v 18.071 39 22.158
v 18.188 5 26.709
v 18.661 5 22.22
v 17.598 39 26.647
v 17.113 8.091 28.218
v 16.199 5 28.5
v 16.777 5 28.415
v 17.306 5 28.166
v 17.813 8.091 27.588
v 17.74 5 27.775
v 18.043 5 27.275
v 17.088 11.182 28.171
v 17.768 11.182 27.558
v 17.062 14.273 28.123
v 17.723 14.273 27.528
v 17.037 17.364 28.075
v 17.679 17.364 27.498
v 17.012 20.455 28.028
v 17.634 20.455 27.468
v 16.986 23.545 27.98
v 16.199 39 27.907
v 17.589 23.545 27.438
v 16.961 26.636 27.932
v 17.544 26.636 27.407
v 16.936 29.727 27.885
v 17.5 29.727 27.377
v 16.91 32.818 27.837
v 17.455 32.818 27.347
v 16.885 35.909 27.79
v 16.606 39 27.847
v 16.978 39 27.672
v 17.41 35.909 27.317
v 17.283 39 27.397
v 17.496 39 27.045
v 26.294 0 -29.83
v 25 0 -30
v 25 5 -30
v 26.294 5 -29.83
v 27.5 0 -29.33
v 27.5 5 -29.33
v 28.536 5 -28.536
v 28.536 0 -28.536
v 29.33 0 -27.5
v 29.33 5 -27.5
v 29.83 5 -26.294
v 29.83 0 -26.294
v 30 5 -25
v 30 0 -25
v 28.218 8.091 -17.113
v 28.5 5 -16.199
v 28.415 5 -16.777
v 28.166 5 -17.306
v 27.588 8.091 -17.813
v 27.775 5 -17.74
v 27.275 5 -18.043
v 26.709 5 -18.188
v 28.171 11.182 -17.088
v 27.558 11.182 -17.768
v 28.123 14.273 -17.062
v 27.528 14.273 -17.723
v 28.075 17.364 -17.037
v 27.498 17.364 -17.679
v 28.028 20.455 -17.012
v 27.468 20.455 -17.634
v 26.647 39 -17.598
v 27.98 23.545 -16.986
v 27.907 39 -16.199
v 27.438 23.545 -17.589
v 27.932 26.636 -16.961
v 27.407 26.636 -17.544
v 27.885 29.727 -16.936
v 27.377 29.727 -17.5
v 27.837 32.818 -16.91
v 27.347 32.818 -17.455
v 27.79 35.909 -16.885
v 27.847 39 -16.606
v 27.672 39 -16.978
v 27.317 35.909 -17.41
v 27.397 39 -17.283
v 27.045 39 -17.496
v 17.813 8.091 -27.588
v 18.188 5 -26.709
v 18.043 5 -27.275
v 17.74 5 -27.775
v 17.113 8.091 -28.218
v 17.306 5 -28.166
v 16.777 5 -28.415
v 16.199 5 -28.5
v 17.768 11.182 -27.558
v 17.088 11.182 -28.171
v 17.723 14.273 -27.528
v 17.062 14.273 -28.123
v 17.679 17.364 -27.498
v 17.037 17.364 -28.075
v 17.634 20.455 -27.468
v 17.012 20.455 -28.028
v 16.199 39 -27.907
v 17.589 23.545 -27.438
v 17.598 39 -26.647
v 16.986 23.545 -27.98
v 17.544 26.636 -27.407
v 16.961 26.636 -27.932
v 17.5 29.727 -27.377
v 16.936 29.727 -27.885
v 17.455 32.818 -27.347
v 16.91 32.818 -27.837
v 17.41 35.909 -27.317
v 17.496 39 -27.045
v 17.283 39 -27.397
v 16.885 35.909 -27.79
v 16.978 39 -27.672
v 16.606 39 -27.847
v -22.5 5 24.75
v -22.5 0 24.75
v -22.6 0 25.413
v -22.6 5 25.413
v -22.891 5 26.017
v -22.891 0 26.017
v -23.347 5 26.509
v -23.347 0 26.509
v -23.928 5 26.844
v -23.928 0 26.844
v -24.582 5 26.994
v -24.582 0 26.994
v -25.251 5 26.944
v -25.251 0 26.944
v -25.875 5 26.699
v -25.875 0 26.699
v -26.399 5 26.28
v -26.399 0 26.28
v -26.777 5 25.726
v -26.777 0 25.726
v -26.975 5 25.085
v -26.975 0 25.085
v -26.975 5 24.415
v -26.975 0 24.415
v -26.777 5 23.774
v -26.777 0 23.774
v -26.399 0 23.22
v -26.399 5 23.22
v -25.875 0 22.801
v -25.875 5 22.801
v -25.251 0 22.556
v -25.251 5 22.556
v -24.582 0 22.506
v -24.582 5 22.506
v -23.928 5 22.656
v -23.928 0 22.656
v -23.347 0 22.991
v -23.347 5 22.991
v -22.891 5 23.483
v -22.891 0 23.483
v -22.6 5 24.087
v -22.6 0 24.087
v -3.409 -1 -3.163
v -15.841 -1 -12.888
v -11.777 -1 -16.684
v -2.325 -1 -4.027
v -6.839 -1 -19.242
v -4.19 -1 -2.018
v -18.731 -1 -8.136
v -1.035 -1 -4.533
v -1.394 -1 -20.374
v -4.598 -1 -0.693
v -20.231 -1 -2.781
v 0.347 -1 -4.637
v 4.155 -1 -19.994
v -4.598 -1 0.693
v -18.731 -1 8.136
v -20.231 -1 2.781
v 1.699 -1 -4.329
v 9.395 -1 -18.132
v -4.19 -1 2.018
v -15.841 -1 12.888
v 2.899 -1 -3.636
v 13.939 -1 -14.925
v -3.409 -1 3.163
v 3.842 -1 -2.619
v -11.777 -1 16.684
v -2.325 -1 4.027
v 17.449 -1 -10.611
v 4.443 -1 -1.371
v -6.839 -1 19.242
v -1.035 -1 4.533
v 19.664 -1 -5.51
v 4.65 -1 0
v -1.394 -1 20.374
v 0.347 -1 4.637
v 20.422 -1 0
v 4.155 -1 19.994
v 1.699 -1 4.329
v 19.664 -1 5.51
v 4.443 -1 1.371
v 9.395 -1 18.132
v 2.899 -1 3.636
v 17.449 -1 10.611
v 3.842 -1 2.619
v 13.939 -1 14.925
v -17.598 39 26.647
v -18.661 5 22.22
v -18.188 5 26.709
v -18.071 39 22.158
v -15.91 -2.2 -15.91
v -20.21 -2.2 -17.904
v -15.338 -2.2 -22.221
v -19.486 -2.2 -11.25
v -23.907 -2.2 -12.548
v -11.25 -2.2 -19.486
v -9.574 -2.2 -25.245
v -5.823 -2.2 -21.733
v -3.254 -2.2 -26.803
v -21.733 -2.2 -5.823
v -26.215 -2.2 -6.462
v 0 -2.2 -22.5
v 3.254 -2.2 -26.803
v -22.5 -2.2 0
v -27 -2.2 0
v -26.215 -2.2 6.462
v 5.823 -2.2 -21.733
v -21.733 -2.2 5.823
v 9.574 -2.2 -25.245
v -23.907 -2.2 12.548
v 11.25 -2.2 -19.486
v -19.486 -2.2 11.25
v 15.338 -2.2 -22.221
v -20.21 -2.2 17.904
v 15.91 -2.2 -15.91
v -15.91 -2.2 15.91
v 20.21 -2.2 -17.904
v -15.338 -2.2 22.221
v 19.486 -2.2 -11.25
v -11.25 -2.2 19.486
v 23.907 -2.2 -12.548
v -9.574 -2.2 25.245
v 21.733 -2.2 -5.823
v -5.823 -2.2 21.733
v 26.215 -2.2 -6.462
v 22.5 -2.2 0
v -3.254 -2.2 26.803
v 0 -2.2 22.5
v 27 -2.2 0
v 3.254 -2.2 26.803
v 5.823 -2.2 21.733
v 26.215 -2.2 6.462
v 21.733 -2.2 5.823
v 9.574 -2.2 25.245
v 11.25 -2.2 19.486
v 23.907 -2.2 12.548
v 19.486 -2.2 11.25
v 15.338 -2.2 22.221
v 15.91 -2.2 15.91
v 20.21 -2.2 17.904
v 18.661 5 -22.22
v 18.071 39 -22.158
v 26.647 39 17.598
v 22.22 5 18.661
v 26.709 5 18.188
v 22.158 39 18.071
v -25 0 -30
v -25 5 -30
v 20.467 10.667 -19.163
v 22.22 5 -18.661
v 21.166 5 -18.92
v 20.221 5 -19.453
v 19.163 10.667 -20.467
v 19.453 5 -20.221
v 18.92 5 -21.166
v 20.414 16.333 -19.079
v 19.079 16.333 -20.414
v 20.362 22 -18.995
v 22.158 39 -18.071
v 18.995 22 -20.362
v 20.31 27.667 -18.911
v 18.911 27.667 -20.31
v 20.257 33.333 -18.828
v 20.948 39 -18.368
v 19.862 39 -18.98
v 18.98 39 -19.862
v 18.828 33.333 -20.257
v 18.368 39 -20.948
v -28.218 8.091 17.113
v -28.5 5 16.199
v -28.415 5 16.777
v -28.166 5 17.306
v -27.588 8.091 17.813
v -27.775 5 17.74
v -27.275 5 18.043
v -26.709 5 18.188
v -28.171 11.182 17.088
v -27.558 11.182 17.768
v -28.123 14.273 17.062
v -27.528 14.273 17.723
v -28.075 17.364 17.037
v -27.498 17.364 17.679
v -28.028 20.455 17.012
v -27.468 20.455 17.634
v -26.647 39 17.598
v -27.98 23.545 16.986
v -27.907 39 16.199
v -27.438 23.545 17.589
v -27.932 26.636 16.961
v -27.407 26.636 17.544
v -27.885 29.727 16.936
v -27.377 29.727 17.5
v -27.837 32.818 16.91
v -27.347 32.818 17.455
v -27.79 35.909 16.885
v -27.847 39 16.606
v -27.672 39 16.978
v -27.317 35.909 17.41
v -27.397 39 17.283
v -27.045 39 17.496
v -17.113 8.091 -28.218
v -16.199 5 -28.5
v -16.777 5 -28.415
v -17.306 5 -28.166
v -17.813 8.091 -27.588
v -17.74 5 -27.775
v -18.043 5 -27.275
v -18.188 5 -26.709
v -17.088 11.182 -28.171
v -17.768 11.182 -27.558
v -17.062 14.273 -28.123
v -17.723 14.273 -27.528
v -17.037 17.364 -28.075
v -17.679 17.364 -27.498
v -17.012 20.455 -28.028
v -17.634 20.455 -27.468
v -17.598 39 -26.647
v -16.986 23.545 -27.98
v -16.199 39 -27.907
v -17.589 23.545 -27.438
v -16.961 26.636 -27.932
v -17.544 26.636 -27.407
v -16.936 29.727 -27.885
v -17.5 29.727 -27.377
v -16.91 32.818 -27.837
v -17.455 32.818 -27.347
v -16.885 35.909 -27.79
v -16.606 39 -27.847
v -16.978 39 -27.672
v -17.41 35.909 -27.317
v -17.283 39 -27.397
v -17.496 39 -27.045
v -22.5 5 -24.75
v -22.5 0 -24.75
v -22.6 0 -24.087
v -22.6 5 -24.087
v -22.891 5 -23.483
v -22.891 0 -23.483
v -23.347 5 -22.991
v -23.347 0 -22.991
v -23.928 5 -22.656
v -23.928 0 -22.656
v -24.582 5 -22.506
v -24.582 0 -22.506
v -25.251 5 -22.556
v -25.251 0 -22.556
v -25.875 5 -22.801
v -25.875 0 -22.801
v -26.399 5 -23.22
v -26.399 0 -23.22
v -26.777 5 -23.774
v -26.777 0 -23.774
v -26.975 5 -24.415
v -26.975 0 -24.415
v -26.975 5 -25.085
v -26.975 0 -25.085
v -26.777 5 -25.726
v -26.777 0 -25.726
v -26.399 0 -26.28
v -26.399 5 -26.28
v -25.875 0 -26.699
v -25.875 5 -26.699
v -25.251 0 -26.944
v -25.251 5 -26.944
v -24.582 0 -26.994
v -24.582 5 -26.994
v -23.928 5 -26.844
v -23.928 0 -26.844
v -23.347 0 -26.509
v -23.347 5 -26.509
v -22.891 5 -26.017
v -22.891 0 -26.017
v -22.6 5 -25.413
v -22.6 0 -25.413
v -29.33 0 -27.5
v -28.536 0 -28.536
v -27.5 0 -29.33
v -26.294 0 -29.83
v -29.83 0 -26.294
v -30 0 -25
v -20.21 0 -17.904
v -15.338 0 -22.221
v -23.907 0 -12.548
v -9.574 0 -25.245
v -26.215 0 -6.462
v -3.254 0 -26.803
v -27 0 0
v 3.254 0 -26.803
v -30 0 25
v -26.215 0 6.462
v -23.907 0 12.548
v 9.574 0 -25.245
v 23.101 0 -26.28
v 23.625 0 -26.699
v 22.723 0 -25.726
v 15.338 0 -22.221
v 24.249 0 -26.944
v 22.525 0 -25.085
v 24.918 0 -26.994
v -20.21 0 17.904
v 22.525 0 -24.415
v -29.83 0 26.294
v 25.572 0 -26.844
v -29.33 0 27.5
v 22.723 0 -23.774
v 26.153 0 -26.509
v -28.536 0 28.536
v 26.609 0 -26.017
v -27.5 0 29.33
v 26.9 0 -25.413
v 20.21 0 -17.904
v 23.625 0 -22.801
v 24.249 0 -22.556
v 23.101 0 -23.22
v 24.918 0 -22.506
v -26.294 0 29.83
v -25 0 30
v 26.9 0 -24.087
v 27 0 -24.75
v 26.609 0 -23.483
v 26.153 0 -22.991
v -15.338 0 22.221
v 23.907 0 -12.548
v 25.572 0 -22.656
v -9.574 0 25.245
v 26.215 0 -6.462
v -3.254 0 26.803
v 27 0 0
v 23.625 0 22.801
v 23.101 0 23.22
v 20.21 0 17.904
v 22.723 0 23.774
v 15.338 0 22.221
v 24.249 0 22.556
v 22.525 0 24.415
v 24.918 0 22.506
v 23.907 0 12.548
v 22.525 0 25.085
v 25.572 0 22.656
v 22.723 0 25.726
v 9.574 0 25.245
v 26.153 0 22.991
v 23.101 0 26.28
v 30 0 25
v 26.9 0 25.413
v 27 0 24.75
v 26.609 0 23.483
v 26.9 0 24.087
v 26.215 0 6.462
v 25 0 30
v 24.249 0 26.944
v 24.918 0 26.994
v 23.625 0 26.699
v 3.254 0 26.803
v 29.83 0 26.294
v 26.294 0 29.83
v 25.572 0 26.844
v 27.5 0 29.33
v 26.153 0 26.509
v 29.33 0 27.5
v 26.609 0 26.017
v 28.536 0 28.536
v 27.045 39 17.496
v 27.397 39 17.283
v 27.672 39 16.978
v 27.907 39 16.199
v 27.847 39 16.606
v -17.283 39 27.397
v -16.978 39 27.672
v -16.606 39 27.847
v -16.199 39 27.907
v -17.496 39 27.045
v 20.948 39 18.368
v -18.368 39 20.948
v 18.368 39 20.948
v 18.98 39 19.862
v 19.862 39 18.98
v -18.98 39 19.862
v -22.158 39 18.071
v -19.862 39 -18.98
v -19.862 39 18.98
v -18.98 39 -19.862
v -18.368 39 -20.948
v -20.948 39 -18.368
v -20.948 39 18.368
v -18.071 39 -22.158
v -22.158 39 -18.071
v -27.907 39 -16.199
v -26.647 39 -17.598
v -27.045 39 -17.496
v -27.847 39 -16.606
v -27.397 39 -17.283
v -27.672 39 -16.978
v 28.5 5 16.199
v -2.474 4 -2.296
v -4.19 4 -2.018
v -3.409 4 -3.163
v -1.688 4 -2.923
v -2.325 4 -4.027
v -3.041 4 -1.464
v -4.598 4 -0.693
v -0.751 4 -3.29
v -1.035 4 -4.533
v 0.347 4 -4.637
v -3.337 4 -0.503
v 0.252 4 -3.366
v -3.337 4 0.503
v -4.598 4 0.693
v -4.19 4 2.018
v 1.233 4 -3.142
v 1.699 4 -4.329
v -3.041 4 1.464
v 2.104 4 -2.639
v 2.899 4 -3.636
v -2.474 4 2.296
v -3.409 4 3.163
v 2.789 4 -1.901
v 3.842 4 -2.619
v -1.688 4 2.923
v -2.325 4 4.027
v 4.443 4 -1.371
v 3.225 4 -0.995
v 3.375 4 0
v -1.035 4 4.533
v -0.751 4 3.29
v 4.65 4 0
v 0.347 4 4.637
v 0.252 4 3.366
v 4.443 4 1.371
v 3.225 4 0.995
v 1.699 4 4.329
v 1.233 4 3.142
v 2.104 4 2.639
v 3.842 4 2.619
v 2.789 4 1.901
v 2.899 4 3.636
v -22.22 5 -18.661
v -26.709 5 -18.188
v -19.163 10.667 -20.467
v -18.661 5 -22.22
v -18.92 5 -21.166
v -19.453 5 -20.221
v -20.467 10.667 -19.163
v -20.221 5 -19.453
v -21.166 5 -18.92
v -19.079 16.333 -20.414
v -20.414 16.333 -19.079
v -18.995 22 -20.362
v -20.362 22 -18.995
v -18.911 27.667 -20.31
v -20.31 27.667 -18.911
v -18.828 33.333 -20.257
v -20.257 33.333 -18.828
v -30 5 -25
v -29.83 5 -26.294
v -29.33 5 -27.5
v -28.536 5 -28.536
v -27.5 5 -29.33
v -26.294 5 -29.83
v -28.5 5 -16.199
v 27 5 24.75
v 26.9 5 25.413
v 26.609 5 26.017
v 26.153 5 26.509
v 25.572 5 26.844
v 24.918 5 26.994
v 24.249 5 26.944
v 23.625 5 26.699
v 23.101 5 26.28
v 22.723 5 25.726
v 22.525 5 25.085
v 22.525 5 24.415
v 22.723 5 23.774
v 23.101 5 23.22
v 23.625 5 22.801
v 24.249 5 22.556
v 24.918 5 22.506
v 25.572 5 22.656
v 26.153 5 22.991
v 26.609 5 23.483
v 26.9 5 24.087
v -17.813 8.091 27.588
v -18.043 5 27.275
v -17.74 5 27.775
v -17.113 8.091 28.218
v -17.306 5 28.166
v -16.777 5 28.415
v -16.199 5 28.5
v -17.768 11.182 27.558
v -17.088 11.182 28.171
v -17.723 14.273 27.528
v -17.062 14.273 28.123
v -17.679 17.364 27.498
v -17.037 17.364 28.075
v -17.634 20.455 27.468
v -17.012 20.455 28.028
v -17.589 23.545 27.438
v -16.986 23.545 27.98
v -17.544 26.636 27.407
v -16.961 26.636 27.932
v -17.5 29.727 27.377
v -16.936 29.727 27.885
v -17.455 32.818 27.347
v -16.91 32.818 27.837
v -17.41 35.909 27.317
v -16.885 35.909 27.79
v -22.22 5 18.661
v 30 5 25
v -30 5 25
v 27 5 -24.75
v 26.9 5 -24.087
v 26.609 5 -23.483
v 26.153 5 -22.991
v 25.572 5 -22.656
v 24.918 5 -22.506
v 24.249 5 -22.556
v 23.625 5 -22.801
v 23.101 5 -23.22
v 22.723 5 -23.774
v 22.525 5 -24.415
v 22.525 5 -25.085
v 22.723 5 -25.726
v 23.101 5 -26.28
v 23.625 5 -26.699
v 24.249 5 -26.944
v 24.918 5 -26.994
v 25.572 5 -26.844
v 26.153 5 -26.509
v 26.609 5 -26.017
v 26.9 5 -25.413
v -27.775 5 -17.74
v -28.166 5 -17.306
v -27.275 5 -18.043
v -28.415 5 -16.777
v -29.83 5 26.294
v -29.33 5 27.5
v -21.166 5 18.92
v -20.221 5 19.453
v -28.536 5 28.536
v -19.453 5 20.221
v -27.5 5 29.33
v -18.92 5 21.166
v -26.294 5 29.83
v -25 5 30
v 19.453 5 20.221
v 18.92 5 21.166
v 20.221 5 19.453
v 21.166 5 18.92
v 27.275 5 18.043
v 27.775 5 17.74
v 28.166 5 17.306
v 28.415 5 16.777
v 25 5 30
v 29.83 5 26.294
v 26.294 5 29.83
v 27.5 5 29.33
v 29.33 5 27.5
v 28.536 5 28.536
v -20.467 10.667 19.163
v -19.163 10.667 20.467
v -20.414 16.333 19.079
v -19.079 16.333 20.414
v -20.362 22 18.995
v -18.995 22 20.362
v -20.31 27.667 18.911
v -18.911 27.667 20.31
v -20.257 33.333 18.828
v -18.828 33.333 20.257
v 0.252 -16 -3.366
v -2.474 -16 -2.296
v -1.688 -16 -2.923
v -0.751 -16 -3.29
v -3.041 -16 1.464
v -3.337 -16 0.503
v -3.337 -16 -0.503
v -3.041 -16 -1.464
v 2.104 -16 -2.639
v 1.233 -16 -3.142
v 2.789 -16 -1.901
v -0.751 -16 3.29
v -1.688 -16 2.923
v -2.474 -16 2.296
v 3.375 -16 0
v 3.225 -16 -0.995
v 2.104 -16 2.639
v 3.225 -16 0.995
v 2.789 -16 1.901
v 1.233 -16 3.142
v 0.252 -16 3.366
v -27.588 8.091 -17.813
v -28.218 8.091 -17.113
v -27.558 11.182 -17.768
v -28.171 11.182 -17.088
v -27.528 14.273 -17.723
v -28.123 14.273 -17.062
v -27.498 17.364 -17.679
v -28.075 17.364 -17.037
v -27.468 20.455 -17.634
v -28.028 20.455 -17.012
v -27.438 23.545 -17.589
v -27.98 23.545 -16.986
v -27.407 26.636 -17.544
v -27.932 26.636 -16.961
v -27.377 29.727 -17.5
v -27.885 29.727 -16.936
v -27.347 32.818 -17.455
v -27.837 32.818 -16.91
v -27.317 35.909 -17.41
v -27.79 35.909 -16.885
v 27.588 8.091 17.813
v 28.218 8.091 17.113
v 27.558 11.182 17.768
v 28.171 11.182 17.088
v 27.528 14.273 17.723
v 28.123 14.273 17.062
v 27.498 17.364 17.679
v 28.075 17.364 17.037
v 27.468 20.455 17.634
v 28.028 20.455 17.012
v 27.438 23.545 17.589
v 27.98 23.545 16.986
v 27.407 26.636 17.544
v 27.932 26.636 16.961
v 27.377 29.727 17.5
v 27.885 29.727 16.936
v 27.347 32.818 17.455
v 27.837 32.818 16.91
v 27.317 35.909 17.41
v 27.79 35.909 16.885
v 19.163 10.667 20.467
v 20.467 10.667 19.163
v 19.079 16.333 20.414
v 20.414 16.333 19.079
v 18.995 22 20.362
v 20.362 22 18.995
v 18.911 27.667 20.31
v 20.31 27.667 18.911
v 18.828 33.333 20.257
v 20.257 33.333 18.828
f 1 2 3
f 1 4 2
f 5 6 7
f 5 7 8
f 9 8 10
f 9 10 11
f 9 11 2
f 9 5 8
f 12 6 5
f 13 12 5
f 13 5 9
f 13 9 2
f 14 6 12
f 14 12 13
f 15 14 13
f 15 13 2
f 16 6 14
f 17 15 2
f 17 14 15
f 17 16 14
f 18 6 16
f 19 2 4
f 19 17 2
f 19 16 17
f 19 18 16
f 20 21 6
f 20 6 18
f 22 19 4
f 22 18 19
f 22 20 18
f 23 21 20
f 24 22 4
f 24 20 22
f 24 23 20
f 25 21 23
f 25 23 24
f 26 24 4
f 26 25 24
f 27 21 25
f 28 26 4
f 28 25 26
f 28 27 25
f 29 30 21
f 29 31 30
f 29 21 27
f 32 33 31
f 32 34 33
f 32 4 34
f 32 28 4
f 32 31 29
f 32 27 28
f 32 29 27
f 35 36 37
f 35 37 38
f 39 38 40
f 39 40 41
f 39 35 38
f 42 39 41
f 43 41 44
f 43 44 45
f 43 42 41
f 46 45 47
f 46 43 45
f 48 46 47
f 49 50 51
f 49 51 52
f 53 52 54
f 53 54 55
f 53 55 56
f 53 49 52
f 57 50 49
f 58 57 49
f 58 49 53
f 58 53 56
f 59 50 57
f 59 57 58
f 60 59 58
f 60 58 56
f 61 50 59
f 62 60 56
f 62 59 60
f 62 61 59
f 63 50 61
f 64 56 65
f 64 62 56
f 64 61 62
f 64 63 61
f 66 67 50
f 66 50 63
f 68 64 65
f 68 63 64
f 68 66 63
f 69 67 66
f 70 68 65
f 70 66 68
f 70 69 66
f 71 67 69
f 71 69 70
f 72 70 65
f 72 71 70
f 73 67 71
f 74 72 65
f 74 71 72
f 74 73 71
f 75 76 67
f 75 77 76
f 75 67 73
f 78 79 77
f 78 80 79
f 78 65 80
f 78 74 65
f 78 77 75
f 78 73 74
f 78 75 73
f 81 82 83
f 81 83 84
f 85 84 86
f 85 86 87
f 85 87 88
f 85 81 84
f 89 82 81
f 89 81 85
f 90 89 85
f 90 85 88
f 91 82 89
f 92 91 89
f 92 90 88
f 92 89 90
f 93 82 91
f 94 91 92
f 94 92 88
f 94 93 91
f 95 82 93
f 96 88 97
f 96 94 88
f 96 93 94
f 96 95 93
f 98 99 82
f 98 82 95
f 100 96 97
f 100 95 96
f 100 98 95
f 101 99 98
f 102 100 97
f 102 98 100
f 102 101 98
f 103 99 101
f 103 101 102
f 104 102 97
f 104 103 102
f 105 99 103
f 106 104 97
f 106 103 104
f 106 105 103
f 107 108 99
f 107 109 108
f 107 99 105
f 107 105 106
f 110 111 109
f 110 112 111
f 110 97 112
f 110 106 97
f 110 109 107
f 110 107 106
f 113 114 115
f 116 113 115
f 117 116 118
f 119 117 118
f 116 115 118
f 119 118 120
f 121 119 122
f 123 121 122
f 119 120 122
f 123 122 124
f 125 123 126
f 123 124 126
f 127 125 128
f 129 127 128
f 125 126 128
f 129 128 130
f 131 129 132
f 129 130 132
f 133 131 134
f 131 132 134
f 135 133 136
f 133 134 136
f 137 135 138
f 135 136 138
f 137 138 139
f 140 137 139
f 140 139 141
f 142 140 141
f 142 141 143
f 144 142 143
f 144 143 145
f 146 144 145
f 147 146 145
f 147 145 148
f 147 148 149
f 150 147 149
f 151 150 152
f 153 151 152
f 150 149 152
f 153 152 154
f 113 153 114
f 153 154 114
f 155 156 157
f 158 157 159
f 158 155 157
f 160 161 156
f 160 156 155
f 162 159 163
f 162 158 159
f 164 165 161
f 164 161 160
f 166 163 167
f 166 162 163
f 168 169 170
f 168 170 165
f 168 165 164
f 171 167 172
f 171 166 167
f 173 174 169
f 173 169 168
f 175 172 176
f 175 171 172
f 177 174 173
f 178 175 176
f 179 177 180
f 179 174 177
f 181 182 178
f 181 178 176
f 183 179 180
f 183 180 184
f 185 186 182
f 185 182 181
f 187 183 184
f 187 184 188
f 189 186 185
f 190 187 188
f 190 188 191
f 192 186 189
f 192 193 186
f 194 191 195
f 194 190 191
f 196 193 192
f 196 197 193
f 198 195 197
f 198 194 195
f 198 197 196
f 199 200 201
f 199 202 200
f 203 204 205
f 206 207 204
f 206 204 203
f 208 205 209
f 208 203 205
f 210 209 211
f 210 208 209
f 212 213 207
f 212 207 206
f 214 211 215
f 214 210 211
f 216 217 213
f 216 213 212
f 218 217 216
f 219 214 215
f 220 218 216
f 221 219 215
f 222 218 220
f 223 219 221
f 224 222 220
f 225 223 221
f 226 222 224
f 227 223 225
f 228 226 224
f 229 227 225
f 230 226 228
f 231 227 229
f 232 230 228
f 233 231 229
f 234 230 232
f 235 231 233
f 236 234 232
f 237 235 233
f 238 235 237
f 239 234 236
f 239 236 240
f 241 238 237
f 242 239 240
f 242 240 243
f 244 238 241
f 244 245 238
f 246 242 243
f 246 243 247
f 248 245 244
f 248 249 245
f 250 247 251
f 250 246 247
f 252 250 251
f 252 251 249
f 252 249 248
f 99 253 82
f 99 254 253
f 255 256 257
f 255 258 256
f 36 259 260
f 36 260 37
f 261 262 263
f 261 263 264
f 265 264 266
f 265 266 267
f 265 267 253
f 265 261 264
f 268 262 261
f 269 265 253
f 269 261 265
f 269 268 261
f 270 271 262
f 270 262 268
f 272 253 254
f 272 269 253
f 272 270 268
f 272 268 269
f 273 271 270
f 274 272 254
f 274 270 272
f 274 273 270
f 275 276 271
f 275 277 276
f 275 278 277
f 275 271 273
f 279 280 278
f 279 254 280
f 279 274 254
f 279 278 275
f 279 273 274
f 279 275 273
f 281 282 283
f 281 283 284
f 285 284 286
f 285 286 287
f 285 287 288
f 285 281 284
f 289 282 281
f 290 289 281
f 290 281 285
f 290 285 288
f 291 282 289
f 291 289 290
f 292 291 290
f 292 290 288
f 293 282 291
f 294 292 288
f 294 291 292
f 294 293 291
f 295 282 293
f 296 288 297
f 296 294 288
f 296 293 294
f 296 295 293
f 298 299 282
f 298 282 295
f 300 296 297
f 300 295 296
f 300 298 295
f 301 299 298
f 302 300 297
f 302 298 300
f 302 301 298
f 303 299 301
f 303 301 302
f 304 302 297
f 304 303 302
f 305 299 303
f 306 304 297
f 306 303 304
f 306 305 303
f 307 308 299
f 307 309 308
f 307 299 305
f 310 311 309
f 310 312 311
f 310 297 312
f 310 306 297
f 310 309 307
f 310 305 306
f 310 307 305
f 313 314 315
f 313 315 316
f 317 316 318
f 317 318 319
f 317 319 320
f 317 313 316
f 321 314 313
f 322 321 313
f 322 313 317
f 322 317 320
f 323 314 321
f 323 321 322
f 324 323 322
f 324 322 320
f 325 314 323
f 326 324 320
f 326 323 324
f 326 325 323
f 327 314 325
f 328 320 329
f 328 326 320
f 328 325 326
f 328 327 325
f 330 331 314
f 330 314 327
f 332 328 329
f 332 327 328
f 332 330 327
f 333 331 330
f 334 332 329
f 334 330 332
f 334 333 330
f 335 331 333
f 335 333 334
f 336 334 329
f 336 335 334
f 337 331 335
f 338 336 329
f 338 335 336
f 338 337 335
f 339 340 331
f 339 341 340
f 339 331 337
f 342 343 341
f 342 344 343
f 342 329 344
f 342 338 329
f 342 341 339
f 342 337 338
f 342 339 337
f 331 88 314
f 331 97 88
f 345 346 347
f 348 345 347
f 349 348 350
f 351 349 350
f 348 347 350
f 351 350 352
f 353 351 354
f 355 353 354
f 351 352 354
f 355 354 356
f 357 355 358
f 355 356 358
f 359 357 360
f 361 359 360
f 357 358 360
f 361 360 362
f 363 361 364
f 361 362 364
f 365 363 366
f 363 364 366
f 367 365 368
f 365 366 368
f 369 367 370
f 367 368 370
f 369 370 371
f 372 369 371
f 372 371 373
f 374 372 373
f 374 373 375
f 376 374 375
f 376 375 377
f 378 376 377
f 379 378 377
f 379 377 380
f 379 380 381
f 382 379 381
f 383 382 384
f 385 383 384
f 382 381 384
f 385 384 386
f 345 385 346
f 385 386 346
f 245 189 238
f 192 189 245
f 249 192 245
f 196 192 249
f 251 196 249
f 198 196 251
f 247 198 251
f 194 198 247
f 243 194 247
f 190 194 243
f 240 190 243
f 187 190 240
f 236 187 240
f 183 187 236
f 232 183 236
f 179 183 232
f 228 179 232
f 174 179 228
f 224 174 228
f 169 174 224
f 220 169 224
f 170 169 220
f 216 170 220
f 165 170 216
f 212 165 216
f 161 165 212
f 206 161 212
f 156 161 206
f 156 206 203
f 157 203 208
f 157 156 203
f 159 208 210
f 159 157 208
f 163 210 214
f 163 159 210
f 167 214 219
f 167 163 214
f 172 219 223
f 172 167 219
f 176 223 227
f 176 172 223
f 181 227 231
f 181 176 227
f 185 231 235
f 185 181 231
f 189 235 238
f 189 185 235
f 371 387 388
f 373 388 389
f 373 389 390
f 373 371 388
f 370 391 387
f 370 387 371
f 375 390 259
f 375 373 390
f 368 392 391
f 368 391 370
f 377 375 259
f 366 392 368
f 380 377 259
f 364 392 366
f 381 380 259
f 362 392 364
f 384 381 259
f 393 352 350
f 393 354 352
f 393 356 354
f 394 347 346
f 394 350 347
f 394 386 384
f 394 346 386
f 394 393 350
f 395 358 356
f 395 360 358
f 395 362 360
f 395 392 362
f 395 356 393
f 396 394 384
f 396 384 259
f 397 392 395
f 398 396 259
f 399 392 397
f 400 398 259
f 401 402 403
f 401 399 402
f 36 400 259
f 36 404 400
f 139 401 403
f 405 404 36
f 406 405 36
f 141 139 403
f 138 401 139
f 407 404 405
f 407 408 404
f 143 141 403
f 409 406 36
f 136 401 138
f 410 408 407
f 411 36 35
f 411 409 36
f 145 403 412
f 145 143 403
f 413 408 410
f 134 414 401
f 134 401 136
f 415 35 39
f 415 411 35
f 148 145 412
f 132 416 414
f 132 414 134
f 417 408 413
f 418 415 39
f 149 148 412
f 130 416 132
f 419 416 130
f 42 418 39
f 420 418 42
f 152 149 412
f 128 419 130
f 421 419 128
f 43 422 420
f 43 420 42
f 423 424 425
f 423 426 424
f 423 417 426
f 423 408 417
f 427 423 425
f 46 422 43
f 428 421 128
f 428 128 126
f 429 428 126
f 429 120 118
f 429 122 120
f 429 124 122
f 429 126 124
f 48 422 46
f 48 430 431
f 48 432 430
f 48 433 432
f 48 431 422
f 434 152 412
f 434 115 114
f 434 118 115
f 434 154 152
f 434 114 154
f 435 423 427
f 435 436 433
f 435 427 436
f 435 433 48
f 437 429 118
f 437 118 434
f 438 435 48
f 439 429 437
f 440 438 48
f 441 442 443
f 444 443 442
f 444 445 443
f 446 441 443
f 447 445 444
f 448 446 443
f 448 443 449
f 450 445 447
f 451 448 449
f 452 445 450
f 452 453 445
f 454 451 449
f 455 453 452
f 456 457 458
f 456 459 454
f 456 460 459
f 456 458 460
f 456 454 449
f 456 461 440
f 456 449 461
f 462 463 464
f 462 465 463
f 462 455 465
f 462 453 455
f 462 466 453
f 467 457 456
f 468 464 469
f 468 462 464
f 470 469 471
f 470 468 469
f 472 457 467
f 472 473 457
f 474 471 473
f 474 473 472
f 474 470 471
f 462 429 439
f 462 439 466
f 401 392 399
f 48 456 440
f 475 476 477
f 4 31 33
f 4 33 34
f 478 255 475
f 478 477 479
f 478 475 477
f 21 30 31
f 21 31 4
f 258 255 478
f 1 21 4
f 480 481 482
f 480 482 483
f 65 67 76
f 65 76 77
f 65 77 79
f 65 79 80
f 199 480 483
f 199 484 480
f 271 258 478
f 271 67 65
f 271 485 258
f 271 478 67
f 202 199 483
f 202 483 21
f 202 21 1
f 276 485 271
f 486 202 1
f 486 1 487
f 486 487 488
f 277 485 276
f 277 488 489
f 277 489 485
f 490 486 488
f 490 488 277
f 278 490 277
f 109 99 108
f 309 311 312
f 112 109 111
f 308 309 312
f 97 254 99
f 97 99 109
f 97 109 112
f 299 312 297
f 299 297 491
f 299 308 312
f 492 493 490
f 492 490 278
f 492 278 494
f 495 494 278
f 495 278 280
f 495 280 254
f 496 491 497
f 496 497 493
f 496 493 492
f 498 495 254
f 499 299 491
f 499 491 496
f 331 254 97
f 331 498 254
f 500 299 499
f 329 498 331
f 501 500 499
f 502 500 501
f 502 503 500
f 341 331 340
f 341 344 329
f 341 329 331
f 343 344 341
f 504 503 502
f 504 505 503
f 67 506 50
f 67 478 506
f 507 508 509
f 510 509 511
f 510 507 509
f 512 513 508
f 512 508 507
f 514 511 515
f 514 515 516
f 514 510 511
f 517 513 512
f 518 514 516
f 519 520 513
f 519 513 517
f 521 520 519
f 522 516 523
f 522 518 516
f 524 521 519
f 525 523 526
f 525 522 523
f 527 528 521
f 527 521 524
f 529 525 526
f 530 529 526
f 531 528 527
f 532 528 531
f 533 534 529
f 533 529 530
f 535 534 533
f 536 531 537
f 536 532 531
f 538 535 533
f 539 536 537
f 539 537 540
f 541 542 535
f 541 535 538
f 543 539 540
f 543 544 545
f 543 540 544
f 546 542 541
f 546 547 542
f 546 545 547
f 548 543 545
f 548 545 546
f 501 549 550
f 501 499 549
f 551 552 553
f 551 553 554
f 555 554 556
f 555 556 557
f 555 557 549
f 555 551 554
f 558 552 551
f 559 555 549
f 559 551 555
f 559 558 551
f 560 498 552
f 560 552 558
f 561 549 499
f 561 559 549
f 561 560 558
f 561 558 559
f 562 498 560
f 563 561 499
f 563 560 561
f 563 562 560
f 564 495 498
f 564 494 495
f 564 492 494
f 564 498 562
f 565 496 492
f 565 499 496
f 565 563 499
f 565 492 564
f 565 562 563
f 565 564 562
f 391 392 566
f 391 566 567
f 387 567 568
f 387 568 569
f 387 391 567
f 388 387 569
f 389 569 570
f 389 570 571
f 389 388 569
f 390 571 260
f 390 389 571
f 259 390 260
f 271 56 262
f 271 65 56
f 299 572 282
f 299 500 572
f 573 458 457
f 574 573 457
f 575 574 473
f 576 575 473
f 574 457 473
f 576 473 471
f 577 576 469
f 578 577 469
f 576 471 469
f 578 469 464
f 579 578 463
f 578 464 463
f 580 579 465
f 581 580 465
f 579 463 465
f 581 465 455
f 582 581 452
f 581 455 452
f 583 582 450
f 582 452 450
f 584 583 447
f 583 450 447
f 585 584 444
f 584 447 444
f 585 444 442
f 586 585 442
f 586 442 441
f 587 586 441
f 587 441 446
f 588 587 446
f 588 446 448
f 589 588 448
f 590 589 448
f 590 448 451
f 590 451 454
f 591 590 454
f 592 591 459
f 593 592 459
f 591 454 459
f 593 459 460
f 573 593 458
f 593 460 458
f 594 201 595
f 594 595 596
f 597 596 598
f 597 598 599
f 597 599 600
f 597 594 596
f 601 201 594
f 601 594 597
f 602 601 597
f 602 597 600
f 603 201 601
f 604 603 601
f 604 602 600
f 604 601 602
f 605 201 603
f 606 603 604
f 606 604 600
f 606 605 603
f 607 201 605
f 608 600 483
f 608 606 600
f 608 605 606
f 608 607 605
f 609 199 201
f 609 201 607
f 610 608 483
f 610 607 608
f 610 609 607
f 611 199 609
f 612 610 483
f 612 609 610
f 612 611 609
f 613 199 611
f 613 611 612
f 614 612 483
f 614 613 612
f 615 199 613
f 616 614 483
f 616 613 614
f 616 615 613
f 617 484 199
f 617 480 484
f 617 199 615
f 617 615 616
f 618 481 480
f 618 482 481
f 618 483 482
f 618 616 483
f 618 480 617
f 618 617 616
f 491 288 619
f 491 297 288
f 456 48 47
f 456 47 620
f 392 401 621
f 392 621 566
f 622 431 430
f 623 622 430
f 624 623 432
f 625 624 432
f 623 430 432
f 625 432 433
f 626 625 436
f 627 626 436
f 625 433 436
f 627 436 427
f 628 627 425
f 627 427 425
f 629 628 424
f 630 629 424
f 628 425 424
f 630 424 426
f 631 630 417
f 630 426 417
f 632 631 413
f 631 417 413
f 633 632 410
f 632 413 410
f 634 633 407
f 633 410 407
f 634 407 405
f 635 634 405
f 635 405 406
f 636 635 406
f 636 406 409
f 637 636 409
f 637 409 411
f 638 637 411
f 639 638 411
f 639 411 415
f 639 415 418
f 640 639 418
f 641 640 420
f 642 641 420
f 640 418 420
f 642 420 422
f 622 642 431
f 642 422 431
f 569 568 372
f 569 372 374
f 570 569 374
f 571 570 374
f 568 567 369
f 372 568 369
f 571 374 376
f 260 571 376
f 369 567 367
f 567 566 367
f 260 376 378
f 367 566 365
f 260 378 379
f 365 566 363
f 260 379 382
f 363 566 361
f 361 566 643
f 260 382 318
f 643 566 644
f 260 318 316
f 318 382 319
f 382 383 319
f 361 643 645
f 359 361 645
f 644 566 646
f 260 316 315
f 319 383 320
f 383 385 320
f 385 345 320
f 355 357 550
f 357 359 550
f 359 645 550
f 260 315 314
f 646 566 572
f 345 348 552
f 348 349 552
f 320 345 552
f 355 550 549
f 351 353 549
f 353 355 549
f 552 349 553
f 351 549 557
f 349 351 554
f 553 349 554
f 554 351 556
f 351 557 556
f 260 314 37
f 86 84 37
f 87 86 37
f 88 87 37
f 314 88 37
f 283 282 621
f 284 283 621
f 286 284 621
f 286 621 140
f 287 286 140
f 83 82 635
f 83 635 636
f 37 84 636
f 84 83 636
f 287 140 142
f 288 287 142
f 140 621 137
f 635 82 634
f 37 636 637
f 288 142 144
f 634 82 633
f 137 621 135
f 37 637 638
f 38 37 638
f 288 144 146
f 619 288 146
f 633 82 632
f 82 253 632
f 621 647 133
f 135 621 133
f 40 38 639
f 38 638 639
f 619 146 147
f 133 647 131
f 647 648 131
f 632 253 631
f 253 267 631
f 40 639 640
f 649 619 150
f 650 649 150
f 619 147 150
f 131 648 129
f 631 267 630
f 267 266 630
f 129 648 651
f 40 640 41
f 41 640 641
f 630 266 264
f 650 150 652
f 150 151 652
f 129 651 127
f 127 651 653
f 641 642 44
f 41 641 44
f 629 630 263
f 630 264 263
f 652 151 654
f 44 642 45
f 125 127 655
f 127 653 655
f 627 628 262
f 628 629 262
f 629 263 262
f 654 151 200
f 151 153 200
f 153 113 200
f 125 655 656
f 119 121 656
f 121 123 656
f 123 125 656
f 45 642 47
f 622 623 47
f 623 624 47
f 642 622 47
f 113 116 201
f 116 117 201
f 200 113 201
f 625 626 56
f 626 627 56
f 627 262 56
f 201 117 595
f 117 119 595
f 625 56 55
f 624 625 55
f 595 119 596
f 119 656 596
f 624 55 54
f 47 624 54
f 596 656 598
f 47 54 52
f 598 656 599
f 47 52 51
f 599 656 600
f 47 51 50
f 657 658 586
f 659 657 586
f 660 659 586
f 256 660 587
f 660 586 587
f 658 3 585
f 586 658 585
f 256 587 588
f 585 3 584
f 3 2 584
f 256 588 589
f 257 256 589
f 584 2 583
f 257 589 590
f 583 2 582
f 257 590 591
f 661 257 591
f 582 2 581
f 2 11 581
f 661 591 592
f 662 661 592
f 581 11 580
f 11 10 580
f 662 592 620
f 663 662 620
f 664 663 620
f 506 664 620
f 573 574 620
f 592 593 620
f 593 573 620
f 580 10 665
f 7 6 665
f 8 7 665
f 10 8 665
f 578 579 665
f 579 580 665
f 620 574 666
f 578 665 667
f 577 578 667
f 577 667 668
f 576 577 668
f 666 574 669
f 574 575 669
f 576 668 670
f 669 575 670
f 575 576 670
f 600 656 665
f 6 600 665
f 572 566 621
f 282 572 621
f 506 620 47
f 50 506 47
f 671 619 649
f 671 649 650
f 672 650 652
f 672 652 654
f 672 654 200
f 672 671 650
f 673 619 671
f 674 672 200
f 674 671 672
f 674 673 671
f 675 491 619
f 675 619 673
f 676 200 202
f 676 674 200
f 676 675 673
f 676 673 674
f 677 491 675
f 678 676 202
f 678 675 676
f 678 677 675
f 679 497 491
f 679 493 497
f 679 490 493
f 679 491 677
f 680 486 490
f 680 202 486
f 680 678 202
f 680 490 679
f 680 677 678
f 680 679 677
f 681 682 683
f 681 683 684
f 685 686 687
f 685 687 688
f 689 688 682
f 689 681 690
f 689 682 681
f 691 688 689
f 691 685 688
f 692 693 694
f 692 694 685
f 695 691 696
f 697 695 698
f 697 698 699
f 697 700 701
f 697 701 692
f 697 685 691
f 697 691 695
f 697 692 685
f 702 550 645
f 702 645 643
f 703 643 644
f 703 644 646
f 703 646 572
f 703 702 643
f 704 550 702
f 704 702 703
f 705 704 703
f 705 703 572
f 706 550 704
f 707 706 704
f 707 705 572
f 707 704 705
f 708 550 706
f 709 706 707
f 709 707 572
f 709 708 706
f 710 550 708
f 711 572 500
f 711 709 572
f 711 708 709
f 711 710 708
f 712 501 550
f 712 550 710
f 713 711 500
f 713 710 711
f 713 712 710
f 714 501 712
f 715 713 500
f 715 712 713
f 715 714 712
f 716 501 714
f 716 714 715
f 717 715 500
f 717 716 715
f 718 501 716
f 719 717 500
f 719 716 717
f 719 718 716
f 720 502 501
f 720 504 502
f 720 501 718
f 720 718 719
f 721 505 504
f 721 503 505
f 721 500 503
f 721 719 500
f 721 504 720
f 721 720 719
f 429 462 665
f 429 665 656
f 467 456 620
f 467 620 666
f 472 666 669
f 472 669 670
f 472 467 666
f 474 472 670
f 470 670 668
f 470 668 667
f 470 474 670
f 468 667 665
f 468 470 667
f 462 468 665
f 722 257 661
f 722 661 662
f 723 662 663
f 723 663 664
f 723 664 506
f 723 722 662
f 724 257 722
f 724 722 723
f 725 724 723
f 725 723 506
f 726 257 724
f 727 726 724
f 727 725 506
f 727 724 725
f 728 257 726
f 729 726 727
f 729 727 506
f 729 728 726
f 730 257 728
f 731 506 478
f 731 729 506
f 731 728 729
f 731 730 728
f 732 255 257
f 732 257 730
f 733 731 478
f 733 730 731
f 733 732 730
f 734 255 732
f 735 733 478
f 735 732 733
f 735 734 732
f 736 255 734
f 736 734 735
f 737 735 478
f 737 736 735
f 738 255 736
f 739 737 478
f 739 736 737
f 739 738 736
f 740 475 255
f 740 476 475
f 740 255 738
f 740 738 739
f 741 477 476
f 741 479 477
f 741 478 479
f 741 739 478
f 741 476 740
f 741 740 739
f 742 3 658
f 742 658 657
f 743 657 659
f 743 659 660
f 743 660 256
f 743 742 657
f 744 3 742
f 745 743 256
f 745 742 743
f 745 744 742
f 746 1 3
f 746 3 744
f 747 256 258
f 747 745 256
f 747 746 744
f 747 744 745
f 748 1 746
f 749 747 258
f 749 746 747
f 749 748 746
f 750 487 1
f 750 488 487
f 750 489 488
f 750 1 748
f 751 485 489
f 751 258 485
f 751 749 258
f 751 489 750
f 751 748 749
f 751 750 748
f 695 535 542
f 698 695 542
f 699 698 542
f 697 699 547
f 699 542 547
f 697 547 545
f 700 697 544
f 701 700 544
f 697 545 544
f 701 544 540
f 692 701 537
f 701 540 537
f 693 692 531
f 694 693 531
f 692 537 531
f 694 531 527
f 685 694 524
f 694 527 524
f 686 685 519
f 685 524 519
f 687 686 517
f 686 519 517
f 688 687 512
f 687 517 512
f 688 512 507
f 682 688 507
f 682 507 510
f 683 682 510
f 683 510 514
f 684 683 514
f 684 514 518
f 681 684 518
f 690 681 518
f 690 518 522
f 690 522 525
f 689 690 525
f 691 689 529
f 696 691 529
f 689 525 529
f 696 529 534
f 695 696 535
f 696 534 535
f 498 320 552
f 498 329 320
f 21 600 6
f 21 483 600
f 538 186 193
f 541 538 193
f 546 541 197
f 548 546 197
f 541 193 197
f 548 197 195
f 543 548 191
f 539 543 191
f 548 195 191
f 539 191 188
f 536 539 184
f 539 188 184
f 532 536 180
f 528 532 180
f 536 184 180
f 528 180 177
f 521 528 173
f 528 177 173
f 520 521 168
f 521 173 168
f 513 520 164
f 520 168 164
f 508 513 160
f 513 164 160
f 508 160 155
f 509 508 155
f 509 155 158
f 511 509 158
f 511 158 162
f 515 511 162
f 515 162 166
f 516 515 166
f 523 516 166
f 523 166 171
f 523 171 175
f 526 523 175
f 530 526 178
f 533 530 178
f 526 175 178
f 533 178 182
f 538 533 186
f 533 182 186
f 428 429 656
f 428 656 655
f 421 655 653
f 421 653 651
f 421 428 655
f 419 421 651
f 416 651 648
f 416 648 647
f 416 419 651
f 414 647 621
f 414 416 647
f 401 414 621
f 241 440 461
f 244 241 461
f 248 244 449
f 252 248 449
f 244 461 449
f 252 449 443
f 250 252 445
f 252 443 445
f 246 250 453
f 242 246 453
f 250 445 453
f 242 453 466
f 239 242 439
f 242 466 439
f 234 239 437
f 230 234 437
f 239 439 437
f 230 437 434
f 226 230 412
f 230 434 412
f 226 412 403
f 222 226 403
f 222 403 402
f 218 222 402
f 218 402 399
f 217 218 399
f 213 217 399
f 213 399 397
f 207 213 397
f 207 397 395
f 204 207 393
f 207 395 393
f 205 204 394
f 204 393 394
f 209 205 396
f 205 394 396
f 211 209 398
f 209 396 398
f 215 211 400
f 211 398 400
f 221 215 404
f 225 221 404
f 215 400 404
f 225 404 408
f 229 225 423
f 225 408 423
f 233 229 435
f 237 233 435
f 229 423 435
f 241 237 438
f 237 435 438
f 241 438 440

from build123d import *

# Parameters (mm, degrees)
F0_R      = 2.25
F1_DEPTH  = 5
F3_DEPTH  = 34
F3_TAPER  = 1
F4_R      = 27
F5_DEPTH  = 2.2
F6_R      = 22.5
F7_DEPTH  = 1.2
F7_TAPER  = 60
F8_R      = 4.65
F9_DEPTH  = 5
F10_R     = 3.375
F11_DEPTH = 20


with BuildPart() as f1:
    # F0 (on Front) → F1 (new body)
    with BuildSketch(Plane.XZ):
        with BuildLine():
            ThreePointArc((30, 25), (28.5355339059, 28.5355339059), (25, 30))
            Line((25, 30), (-25, 30))
            ThreePointArc((-25, 30), (-28.5355339059, 28.5355339059), (-30, 25))
            Line((-30, 25), (-30, -25))
            ThreePointArc((-30, -25), (-28.5355339059, -28.5355339059), (-25, -30))
            Line((-25, -30), (25, -30))
            ThreePointArc((25, -30), (28.5355339059, -28.5355339059), (30, -25))
            Line((30, -25), (30, 25))
        make_face()
        with Locations((-24.75, -24.75)):
            Circle(F0_R, mode=Mode.SUBTRACT)
        with Locations((24.75, -24.75)):
            Circle(F0_R, mode=Mode.SUBTRACT)
        with Locations((-24.75, 24.75)):
            Circle(F0_R, mode=Mode.SUBTRACT)
        with Locations((24.75, 24.75)):
            Circle(F0_R, mode=Mode.SUBTRACT)
    extrude(amount=-F1_DEPTH)

    # F2 (on face) → F3 (join)
    with BuildSketch(Plane(origin=(0, 5, 0), x_dir=(-1, 0, 0), z_dir=(0, 1, 0))):
        with BuildLine():
            Line((-16.1994765079, -28.5), (16.1994765079, -28.5))
            ThreePointArc((16.1994765079, -28.5), (17.5376209063, -27.9863948227), (18.1884874138, -26.709369569))
            Line((18.1884874138, -26.709369569), (18.6610206978, -22.2203033714))
            ThreePointArc((18.6610206978, -22.2203033714), (19.8106153847, -19.8106153847), (22.2203033714, -18.6610206978))
            Line((22.2203033714, -18.6610206978), (26.709369569, -18.1884874138))
            ThreePointArc((26.709369569, -18.1884874138), (27.9863948227, -17.5376209063), (28.5, -16.1994765079))
            Line((28.5, -16.1994765079), (28.5, 16.1994765079))
            ThreePointArc((28.5, 16.1994765079), (27.9863948227, 17.5376209063), (26.709369569, 18.1884874138))
            Line((26.709369569, 18.1884874138), (22.2203033714, 18.6610206978))
            ThreePointArc((22.2203033714, 18.6610206978), (19.8106153847, 19.8106153847), (18.6610206978, 22.2203033714))
            Line((18.6610206978, 22.2203033714), (18.1884874138, 26.709369569))
            ThreePointArc((18.1884874138, 26.709369569), (17.5376209063, 27.9863948227), (16.1994765079, 28.5))
            Line((16.1994765079, 28.5), (-16.1994765079, 28.5))
            ThreePointArc((-16.1994765079, 28.5), (-17.5376209063, 27.9863948227), (-18.1884874138, 26.709369569))
            Line((-18.1884874138, 26.709369569), (-18.6610206978, 22.2203033714))
            ThreePointArc((-18.6610206978, 22.2203033714), (-19.8106153847, 19.8106153847), (-22.2203033714, 18.6610206978))
            Line((-22.2203033714, 18.6610206978), (-26.709369569, 18.1884874138))
            ThreePointArc((-26.709369569, 18.1884874138), (-27.9863948227, 17.5376209063), (-28.5, 16.1994765079))
            Line((-28.5, 16.1994765079), (-28.5, -16.1994765079))
            ThreePointArc((-28.5, -16.1994765079), (-27.9863948227, -17.5376209063), (-26.709369569, -18.1884874138))
            Line((-26.709369569, -18.1884874138), (-22.2203033714, -18.6610206978))
            ThreePointArc((-22.2203033714, -18.6610206978), (-19.8106153847, -19.8106153847), (-18.6610206978, -22.2203033714))
            Line((-18.6610206978, -22.2203033714), (-18.1884874138, -26.709369569))
            ThreePointArc((-18.1884874138, -26.709369569), (-17.5376209063, -27.9863948227), (-16.1994765079, -28.5))
        make_face()
    extrude(amount=F3_DEPTH, taper=F3_TAPER)

    # F4 (on face) → F5 (join)
    with BuildSketch(Plane.XZ):
        Circle(F4_R)
    extrude(amount=F5_DEPTH)

    # F6 (on face) → F7 (cut)
    with BuildSketch(Plane.XZ.offset(2.2)):
        Circle(F6_R)
    extrude(amount=-F7_DEPTH, taper=F7_TAPER, mode=Mode.SUBTRACT)

    # F8 (on face) → F9 (cut)
    with BuildSketch(Plane.XZ.offset(1)):
        Circle(F8_R)
    extrude(amount=-F9_DEPTH, mode=Mode.SUBTRACT)

    # F10 (on face) → F11 (join)
    with BuildSketch(Plane.XZ.offset(-4)):
        Circle(F10_R)
    extrude(amount=F11_DEPTH)


solid = f1.part
